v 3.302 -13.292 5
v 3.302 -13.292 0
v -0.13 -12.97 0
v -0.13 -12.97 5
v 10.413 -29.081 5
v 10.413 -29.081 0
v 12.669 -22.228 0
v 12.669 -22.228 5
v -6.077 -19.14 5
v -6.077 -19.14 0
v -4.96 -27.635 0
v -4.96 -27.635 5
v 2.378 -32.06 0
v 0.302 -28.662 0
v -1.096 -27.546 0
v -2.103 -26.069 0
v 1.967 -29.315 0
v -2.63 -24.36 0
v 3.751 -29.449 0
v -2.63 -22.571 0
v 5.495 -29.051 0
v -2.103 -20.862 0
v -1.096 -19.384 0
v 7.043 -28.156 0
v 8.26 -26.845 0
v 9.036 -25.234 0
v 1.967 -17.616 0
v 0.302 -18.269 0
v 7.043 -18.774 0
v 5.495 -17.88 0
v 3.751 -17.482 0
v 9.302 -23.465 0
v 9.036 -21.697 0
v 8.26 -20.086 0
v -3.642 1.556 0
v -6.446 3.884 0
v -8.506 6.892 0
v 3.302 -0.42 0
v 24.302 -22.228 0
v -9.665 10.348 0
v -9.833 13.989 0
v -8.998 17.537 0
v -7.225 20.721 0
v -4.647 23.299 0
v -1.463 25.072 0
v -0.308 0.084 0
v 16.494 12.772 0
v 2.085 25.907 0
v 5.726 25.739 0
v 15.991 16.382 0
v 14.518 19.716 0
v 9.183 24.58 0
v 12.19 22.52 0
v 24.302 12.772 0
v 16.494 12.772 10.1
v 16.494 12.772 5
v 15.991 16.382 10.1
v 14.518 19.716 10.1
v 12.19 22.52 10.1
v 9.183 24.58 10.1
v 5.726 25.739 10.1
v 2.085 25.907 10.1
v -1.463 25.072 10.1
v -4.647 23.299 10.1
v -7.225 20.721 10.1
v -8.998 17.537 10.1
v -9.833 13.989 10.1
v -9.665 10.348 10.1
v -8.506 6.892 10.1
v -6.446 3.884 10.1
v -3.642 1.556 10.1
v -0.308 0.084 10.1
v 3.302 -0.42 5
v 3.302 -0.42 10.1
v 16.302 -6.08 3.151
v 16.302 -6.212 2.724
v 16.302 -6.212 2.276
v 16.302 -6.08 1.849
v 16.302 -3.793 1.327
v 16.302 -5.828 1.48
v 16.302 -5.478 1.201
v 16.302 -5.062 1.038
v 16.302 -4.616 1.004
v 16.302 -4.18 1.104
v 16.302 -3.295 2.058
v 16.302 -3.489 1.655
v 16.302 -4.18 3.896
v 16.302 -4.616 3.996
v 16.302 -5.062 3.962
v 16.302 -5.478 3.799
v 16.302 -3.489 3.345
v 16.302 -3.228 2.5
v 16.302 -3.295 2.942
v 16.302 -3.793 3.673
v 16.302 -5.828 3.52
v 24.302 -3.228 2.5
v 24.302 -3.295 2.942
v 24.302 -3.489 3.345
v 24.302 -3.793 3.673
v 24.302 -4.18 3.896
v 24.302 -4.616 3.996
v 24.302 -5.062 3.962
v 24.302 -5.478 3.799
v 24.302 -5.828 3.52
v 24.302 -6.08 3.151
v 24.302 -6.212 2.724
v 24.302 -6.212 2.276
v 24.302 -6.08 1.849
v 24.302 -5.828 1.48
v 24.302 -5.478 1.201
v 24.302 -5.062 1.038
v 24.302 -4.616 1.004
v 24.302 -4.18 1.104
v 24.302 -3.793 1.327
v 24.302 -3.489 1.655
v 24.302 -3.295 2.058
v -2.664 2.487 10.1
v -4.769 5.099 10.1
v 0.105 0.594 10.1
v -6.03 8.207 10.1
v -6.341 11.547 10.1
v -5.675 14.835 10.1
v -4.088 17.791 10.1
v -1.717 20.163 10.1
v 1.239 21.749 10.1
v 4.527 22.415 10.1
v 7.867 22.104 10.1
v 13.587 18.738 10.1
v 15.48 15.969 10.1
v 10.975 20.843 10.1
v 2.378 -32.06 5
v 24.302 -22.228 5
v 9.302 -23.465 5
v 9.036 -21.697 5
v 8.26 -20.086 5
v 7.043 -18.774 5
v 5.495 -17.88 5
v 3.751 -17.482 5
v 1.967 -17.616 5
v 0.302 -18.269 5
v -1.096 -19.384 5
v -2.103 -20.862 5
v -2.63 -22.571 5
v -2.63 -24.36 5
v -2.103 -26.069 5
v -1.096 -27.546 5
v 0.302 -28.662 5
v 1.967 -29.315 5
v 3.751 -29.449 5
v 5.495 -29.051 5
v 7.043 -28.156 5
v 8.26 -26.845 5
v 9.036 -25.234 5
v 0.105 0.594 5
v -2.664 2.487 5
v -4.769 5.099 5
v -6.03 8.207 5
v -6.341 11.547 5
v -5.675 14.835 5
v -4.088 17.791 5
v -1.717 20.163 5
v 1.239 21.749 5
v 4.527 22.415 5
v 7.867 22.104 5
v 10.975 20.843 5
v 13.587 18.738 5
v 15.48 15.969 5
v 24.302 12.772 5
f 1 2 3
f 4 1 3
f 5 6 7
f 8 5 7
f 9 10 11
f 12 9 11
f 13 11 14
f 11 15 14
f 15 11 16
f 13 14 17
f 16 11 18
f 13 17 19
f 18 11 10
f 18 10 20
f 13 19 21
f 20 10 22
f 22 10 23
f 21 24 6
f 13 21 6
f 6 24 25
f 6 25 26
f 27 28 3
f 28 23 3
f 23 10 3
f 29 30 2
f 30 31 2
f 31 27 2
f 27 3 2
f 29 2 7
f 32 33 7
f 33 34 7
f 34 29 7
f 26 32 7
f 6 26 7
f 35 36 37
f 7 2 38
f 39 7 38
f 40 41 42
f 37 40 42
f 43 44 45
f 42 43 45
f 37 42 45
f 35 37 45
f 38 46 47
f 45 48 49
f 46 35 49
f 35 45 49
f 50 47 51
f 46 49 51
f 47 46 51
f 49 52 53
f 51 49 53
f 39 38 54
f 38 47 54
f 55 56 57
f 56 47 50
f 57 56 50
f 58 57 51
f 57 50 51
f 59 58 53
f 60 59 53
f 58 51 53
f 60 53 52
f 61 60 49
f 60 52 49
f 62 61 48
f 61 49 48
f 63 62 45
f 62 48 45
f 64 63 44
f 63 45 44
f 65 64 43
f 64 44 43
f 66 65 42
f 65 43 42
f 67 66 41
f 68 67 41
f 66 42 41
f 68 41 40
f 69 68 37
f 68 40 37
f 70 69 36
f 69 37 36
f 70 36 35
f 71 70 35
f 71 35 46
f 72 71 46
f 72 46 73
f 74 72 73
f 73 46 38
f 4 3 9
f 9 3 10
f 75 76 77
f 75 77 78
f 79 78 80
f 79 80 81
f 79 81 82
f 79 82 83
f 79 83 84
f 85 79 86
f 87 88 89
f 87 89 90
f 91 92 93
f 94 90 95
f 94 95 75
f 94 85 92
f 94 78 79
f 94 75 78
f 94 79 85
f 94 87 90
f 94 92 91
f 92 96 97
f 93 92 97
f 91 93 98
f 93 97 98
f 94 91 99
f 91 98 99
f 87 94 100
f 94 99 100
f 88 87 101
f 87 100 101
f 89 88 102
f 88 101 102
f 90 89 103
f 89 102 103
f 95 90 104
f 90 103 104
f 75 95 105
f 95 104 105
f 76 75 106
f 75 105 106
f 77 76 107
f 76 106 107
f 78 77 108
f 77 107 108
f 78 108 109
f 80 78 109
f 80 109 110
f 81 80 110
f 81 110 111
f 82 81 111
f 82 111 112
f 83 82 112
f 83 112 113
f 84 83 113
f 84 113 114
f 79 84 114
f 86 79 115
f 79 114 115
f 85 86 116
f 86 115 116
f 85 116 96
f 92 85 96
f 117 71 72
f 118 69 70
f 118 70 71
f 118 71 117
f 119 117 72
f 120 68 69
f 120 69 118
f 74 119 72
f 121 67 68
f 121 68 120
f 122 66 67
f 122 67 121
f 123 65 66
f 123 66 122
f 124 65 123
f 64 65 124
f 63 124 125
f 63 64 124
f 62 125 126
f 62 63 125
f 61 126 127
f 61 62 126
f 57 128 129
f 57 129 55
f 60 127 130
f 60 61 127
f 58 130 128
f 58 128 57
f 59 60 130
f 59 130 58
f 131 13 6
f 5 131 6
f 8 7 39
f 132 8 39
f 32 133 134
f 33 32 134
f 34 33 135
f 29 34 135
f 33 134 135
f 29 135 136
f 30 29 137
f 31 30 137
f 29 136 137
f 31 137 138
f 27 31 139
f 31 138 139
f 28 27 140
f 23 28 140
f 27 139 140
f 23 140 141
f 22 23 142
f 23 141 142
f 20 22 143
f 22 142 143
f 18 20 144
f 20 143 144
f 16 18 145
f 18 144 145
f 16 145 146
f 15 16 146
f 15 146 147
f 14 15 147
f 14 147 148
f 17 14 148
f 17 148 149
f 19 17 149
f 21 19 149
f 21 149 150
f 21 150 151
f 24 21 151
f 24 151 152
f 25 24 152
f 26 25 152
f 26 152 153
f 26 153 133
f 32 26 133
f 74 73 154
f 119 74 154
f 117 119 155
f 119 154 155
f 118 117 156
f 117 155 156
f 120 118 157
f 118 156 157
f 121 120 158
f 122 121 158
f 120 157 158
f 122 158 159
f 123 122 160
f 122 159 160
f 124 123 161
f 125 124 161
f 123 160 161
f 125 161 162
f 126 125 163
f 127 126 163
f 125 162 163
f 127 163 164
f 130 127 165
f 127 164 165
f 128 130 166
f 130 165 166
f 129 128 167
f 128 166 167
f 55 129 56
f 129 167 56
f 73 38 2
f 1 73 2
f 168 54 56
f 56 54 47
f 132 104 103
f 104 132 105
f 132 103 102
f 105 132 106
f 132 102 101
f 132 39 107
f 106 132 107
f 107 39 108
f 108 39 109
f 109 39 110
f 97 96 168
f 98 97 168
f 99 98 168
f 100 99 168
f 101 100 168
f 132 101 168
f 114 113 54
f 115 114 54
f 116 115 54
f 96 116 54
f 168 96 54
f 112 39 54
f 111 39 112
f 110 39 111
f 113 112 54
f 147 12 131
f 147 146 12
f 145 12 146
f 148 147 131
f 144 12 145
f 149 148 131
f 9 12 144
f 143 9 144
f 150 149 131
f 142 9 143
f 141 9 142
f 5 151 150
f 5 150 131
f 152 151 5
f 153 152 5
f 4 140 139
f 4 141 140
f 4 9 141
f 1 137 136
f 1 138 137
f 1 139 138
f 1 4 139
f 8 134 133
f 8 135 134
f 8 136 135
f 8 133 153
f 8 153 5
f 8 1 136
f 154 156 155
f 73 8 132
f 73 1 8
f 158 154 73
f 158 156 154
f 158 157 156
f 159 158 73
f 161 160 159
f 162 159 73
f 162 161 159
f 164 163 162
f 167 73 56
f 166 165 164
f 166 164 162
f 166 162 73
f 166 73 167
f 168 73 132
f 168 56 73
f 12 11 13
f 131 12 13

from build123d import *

# Parameters (mm, degrees)
F1_DEPTH = 5
F3_DEPTH = 5.1
F4_R     = 1.5
F5_DEPTH = 8
F6_R     = 6
F7_DEPTH = 25


with BuildPart() as f1:
    # F0 (on Top) → F1 (new body)
    with BuildSketch(Plane.XY):
        with BuildLine():
            Line((24.302487, 12.771593), (16.494151, 12.771593))
            ThreePointArc((16.494151, 12.771593), (-6.025428, 22.099508), (3.302487, -0.420071))
            Line((3.302487, -0.420071), (3.302487, -13.292416))
            Line((3.302487, -13.292416), (3.302487, -22.228407))
            Line((3.302487, -22.228407), (12.669307, -22.228407))
            Line((12.669307, -22.228407), (24.302487, -22.228407))
            Line((24.302487, -22.228407), (24.302487, 12.771593))
        make_face()
        Polygon((3.302487, -22.228407), (3.302487, -13.292416), (-0.130287, -12.969643), (-6.076606, -19.139513), (-4.960277, -27.635384), (2.378083, -32.059691), (10.412538, -29.080841), (12.669307, -22.228407), align=None)
    extrude(amount=F1_DEPTH)

    # F2 (on face) → F3 (join)
    with BuildSketch(Plane.XY.offset(5)):
        with BuildLine():
            ThreePointArc((3.302487, -0.420071), (-2.989457, 19.063537), (16.494151, 12.771593))
            ThreePointArc((16.494151, 12.771593), (-6.025428, 22.099508), (3.302487, -0.420071))
        make_face()
    extrude(amount=F3_DEPTH)

    # F4 (on face) → F5 (cut)
    with BuildSketch(Plane.YZ.offset(24.302487)):
        with Locations((-4.728407, 2.5)):
            Circle(F4_R)
    extrude(amount=-F5_DEPTH, mode=Mode.SUBTRACT)

    # F6 (on face) → F7 (cut)
    with BuildSketch(Plane.XY.offset(5)):
        with Locations((3.302487, -23.465436)):
            Circle(F6_R)
    extrude(amount=-F7_DEPTH, mode=Mode.SUBTRACT)


solid = f1.part
